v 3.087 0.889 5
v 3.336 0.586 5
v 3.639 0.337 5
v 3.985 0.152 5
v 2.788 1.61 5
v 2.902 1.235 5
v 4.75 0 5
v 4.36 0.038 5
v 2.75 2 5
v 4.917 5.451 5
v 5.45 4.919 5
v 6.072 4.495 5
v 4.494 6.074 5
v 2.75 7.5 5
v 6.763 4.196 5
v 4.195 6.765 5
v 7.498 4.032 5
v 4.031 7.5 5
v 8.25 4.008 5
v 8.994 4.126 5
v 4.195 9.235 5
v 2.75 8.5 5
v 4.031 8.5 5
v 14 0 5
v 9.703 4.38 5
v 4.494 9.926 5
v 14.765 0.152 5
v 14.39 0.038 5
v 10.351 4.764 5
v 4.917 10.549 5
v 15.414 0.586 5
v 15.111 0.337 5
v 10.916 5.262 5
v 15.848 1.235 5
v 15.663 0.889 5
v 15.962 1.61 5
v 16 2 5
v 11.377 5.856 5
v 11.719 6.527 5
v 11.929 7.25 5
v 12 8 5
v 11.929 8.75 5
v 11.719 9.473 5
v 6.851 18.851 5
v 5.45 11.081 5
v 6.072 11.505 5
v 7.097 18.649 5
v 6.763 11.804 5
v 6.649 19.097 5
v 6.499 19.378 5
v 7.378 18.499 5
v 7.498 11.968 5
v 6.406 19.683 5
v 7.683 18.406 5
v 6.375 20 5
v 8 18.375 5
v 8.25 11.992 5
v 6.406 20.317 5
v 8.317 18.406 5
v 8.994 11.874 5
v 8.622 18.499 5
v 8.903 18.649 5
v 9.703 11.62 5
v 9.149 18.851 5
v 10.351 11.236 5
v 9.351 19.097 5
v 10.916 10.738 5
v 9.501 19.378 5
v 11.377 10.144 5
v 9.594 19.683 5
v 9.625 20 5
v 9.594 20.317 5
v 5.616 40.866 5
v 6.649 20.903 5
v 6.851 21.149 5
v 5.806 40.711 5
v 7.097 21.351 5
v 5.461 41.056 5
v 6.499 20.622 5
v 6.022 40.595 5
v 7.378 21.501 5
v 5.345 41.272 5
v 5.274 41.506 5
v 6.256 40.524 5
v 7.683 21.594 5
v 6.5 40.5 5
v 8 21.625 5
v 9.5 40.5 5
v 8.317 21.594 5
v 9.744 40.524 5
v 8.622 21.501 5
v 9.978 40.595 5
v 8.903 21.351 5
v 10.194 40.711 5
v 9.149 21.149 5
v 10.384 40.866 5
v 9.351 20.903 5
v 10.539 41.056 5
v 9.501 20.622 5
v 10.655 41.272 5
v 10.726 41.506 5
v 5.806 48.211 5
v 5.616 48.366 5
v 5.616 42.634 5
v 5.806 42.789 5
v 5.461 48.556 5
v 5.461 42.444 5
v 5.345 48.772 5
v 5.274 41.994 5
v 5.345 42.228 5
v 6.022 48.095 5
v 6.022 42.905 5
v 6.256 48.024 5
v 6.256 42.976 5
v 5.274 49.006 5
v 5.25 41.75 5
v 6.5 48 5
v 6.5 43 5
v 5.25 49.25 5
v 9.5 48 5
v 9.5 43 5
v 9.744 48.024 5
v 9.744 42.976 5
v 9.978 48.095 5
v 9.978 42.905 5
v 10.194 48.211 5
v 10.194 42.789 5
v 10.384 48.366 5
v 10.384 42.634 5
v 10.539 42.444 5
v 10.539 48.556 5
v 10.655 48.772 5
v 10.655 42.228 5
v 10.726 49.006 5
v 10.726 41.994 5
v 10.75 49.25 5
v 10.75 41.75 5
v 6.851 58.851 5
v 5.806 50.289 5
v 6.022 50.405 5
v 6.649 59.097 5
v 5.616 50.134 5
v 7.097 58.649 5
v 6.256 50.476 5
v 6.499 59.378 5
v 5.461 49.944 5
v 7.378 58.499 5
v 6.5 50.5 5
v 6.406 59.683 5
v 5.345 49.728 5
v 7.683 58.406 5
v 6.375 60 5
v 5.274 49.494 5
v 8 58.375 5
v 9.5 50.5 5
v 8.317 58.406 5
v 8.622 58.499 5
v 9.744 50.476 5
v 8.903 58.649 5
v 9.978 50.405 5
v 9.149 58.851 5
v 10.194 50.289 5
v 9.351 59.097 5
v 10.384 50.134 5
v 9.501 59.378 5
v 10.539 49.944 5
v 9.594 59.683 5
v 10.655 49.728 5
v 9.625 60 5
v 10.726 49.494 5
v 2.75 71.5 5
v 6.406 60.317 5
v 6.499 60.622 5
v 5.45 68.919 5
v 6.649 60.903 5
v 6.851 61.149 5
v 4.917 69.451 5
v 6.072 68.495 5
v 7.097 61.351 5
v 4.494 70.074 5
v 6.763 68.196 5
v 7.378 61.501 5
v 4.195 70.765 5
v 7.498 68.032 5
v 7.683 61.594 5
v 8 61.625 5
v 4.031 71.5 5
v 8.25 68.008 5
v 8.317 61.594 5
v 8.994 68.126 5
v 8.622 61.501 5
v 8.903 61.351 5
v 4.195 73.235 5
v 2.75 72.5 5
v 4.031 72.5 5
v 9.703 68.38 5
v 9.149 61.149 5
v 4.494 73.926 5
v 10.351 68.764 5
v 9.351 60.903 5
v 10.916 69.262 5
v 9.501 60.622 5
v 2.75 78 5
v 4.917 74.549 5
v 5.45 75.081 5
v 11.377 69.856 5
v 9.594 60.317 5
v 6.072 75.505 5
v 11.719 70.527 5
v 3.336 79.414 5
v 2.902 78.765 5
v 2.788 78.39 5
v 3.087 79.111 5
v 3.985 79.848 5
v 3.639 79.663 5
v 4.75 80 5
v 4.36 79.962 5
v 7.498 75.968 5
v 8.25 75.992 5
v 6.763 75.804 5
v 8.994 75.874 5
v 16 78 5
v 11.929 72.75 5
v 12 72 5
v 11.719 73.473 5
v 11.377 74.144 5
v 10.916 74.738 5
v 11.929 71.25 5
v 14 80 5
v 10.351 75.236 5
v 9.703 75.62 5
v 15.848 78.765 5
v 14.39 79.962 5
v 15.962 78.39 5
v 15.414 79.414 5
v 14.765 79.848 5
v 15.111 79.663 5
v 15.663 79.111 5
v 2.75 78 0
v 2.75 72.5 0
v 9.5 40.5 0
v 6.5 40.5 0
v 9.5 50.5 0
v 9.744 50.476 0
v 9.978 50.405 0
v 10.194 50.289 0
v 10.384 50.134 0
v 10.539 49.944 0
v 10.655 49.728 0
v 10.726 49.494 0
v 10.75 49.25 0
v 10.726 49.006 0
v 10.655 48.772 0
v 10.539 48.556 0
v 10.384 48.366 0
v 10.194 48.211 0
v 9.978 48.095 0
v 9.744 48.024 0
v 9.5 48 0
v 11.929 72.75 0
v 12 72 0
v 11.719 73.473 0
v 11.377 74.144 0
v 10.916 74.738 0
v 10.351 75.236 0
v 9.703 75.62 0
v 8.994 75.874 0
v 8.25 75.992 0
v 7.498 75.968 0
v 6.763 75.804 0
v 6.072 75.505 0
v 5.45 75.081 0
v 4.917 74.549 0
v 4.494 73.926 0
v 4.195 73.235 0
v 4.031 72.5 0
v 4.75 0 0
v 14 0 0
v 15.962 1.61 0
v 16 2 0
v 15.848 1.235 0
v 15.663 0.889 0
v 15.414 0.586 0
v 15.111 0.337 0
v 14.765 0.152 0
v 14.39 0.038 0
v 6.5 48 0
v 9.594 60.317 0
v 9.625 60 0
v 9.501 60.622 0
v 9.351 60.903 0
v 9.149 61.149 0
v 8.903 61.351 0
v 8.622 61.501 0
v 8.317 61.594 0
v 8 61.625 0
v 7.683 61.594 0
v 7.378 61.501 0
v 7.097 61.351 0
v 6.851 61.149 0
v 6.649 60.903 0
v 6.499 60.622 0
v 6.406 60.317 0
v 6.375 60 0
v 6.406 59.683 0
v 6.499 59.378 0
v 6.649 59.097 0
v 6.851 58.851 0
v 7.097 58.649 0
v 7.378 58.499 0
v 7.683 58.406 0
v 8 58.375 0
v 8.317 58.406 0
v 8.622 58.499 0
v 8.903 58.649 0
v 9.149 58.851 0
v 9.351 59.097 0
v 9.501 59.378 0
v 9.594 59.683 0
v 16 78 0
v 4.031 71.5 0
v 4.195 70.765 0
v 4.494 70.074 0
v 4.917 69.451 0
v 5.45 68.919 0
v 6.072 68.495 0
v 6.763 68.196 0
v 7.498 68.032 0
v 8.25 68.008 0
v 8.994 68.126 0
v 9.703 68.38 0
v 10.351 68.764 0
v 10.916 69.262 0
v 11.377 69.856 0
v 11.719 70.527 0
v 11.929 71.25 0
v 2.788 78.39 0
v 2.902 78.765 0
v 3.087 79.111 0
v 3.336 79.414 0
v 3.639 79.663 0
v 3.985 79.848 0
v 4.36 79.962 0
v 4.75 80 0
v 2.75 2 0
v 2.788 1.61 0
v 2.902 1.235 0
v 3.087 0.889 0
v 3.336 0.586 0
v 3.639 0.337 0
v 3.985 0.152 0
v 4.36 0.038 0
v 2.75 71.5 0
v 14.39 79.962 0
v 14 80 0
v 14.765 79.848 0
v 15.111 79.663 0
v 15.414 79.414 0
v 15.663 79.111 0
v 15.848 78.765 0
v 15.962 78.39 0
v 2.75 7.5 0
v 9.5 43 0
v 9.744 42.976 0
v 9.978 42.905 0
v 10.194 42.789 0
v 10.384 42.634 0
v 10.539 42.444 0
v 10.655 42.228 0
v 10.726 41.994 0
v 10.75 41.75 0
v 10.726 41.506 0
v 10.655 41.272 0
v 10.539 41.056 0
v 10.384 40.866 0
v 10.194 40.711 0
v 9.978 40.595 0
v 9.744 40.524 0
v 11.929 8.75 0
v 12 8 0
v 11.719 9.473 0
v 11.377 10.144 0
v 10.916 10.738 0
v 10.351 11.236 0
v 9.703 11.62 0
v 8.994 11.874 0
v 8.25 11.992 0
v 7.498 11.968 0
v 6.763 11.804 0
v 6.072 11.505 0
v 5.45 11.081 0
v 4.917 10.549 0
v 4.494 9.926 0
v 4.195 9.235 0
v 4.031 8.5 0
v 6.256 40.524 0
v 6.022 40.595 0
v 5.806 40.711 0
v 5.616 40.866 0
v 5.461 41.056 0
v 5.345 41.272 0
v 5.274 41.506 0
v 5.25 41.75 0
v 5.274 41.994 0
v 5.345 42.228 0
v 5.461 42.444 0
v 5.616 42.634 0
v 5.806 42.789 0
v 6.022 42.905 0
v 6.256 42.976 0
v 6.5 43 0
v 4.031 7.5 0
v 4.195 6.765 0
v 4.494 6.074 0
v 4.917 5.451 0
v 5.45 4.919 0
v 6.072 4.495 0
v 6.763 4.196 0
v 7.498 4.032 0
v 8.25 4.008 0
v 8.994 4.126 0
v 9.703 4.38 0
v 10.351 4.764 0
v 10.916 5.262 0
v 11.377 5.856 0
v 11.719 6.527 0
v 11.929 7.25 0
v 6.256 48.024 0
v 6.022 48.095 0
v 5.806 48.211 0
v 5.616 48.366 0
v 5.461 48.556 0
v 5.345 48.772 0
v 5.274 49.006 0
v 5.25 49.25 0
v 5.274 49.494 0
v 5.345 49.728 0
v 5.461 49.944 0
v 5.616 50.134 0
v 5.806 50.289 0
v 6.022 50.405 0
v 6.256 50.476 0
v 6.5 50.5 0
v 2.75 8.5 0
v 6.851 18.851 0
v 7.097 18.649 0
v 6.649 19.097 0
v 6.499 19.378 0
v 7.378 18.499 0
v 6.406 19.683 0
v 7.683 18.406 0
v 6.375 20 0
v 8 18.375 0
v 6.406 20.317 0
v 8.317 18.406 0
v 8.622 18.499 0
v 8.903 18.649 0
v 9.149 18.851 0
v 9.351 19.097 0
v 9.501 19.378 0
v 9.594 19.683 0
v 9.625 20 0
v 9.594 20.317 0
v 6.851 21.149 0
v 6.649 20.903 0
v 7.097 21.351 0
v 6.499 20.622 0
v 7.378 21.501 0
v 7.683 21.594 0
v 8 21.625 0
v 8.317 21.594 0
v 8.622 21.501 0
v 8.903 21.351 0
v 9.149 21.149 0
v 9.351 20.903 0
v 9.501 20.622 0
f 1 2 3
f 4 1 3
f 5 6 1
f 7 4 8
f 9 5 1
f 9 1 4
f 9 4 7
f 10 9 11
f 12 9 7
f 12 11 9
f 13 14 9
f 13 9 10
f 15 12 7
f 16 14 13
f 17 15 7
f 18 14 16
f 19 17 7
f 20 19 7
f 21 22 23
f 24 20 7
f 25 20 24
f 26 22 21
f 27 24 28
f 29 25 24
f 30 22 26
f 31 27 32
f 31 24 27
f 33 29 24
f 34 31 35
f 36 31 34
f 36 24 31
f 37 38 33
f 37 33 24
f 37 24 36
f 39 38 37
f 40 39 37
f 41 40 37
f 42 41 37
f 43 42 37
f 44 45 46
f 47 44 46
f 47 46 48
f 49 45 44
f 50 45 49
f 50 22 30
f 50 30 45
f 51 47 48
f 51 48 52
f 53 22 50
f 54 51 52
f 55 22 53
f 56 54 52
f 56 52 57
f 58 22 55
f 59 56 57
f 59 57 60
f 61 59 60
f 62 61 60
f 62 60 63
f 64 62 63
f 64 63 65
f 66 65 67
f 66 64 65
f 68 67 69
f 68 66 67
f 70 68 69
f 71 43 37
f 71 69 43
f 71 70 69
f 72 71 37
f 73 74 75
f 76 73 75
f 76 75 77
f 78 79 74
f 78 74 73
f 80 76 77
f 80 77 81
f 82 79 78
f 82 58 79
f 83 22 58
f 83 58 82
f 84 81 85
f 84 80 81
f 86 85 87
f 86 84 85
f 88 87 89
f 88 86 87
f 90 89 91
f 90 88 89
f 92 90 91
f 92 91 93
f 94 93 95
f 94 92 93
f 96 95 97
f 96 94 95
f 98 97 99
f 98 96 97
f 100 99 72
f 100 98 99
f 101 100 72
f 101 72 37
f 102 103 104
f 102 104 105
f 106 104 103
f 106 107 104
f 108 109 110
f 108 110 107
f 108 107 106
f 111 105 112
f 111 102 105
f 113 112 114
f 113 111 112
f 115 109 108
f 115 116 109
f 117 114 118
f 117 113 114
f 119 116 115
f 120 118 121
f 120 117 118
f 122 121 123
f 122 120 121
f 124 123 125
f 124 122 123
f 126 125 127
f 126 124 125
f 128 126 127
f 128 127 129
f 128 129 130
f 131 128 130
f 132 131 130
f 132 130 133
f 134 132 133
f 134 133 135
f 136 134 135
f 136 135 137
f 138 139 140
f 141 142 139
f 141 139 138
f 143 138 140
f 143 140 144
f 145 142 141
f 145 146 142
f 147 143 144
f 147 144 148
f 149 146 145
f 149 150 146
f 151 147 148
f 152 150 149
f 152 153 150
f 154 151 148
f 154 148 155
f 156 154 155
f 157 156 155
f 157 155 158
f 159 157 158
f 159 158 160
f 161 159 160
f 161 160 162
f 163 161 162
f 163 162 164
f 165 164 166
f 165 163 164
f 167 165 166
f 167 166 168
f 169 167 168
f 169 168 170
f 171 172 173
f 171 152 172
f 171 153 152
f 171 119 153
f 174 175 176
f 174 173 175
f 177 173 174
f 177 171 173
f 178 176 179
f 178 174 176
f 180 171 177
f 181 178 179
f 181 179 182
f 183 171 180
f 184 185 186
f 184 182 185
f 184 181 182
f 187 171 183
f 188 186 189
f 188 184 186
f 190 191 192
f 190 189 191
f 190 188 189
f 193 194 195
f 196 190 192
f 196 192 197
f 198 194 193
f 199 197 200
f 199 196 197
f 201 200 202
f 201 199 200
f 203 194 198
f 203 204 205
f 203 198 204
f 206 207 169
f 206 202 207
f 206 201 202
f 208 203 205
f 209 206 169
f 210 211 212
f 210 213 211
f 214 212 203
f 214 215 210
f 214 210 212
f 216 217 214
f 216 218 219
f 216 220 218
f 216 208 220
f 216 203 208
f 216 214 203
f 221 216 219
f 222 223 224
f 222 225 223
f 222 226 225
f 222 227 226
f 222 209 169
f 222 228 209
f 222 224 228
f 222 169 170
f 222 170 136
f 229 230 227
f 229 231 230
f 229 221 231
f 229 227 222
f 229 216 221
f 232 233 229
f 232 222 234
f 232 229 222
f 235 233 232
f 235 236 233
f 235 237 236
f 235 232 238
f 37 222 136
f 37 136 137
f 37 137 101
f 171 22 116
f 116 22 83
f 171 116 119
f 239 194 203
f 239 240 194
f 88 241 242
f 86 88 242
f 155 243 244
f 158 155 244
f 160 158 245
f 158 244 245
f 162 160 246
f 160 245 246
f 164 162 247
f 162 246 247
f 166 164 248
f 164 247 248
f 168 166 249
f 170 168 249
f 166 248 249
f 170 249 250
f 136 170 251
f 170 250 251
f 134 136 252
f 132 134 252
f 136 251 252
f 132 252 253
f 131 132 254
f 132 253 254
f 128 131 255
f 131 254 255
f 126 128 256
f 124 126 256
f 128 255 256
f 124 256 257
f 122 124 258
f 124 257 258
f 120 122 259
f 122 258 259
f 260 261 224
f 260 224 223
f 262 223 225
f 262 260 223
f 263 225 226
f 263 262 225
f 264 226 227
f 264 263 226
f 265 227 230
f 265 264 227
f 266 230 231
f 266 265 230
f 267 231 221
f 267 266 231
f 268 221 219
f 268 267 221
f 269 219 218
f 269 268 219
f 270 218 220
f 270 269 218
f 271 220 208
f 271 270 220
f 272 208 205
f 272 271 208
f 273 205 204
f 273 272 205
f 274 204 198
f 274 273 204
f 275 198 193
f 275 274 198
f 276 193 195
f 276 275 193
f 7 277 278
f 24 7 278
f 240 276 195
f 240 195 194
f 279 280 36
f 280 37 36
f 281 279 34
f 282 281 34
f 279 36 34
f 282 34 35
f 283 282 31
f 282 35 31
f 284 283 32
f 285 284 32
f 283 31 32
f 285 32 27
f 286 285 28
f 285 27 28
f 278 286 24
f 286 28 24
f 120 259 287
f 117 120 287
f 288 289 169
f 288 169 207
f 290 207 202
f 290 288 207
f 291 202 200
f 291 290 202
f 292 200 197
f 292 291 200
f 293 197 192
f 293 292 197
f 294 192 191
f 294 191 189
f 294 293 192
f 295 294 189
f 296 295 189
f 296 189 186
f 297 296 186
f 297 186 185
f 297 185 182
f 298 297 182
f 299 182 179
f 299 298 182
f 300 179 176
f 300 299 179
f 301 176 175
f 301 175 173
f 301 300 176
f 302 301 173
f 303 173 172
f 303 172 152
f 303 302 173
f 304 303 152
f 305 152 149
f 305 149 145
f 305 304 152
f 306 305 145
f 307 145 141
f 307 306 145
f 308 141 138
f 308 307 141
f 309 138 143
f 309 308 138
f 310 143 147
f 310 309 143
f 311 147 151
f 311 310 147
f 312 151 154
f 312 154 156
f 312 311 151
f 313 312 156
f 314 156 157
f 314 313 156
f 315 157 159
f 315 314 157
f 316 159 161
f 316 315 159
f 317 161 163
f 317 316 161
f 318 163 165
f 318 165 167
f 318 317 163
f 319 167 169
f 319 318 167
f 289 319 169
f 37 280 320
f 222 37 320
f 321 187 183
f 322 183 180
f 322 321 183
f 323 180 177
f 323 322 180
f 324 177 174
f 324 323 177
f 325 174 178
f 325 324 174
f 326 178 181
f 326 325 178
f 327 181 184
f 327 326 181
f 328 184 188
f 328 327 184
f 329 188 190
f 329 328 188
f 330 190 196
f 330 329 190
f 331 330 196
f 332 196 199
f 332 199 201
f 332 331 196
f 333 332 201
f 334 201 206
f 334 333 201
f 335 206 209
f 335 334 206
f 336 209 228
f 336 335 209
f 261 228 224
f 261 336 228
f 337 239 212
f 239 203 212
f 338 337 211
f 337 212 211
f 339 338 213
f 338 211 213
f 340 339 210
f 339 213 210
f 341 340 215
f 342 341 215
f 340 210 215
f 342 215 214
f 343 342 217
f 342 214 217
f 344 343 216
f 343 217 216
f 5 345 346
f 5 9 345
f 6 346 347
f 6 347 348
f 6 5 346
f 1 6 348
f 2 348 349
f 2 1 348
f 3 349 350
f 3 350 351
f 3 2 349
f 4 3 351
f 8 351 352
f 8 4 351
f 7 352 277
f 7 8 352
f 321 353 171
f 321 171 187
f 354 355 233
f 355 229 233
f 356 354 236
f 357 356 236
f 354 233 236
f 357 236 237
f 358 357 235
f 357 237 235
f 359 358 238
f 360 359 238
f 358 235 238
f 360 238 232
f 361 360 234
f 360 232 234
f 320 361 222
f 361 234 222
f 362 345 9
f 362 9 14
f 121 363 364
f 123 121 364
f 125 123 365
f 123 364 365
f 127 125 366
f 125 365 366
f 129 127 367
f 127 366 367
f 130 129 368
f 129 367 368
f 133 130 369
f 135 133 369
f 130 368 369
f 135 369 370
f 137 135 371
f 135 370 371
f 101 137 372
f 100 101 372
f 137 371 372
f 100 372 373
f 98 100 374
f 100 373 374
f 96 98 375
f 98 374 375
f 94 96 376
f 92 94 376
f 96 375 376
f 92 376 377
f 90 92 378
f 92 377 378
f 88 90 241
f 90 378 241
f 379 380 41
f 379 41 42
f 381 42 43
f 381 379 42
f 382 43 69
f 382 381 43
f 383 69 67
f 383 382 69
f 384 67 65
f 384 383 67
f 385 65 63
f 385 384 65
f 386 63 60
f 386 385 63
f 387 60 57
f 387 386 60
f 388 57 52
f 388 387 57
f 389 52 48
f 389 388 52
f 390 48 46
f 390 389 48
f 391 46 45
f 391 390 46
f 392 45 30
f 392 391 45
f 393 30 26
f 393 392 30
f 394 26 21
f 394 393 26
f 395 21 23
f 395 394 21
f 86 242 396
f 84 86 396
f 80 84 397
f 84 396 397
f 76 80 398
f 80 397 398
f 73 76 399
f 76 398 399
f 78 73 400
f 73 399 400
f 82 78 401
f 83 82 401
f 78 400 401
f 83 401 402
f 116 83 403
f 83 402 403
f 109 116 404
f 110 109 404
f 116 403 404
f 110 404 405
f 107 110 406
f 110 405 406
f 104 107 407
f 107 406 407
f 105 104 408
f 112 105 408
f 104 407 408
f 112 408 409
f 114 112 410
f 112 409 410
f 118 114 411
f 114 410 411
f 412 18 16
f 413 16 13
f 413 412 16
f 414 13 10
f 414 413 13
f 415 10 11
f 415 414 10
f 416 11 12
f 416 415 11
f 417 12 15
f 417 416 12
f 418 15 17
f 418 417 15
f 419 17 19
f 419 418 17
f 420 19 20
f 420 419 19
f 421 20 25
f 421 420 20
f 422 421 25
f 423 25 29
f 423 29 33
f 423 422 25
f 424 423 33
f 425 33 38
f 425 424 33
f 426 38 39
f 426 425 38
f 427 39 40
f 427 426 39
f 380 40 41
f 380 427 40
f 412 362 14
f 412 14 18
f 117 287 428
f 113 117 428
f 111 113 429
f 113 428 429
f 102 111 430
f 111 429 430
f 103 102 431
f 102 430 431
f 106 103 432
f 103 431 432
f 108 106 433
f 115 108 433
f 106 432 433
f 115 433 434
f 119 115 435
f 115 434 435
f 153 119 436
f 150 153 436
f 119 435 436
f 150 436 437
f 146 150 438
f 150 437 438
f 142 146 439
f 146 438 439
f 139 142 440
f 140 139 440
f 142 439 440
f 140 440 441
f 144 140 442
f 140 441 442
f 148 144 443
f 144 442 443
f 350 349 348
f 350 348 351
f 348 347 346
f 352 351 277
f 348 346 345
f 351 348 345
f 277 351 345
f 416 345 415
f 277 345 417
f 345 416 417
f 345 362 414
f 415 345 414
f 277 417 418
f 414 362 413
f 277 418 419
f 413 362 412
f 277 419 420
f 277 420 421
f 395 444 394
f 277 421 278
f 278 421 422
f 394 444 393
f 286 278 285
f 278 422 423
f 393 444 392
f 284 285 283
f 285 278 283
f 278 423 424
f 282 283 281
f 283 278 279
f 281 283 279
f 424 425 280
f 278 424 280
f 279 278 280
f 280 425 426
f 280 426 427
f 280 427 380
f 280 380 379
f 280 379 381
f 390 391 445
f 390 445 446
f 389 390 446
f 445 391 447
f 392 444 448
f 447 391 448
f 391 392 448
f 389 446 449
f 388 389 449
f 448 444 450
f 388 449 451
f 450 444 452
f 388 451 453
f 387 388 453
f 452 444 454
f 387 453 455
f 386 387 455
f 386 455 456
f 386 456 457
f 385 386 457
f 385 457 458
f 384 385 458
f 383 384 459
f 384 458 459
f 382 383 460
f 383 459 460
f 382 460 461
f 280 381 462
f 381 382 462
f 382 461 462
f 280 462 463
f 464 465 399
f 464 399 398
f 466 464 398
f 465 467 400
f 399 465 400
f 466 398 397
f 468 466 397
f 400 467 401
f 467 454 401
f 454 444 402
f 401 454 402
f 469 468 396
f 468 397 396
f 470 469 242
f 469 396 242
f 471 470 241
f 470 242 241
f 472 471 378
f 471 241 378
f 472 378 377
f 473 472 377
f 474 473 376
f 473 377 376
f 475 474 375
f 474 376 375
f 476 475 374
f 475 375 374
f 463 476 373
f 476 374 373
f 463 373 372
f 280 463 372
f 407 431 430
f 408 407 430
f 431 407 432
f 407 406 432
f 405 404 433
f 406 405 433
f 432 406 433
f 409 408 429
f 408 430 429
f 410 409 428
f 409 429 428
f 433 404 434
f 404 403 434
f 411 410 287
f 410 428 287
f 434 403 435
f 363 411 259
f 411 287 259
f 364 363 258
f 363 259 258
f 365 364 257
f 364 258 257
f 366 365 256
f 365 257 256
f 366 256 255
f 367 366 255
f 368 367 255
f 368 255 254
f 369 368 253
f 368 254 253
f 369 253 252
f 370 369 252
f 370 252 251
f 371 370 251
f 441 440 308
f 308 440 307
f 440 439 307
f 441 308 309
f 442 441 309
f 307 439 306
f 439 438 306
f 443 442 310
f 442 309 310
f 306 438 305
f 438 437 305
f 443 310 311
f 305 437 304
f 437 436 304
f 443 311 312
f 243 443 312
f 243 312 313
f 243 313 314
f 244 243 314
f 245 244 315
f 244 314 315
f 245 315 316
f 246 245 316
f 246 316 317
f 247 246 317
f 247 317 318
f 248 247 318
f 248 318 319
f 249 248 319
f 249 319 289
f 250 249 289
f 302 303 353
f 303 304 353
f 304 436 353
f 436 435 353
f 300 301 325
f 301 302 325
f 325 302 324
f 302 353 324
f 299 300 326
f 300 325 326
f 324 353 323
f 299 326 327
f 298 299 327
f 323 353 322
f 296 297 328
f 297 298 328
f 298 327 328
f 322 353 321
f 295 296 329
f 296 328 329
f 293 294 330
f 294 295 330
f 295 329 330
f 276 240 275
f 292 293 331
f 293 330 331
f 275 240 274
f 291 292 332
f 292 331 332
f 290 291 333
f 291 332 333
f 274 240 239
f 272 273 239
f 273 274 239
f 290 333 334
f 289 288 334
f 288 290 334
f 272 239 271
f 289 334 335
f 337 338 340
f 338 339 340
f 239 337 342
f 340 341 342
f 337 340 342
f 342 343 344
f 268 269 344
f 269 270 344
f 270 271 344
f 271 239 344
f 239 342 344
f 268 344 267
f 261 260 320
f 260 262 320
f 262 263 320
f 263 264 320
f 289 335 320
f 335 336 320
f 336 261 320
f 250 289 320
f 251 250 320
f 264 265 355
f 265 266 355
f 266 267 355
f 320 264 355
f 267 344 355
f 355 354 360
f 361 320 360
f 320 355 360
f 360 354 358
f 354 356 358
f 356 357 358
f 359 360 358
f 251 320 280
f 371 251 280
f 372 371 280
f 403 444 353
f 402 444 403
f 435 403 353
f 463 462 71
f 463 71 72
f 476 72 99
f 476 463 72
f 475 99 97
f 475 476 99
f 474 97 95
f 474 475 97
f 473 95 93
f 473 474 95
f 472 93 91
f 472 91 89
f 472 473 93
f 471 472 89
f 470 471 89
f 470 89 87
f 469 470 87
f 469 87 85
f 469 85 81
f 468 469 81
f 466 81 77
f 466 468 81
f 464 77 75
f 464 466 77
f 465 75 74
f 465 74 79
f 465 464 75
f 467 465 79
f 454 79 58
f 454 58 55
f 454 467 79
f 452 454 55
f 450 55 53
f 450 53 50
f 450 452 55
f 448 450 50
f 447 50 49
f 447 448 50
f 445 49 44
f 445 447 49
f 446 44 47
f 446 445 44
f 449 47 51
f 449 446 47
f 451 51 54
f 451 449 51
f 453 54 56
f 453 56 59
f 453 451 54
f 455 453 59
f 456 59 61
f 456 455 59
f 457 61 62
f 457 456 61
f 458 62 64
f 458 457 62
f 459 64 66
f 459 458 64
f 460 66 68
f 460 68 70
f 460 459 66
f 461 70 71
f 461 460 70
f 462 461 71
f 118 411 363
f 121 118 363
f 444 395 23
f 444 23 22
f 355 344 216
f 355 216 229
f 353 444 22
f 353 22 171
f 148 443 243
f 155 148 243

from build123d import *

# Parameters (mm, degrees)
SKETCH1_W           = 16
SKETCH1_H           = 80
SKETCH1_R           = 4
SKETCH1_R_2         = 1.625
BOSS_EXTRUDE1_DEPTH = 5
CUT_EXTRUDE3_DEPTH  = 82.737384348
SKETCH4_W           = 2.75
SKETCH4_H           = 80
CUT_EXTRUDE4_DEPTH  = 82.737384348
FILLET1_R           = 2


with BuildPart() as part:
    # Sketch1 → Boss-Extrude1 (new body)
    with BuildSketch(Plane.XY):
        with Locations((8, 40)):
            Rectangle(SKETCH1_W, SKETCH1_H)
        with Locations((8, 72)):
            Circle(SKETCH1_R, mode=Mode.SUBTRACT)
        with Locations((8, 8)):
            Circle(SKETCH1_R, mode=Mode.SUBTRACT)
        with Locations((8, 20)):
            Circle(SKETCH1_R_2, mode=Mode.SUBTRACT)
        with Locations((8, 60)):
            Circle(SKETCH1_R_2, mode=Mode.SUBTRACT)
        with BuildLine():
            Line((6.5, 50.5), (9.5, 50.5))
            ThreePointArc((9.5, 50.5), (10.75, 49.25), (9.5, 48))
            Line((9.5, 48), (6.5, 48))
            ThreePointArc((6.5, 48), (5.25, 49.25), (6.5, 50.5))
        make_face(mode=Mode.SUBTRACT)
        with BuildLine():
            Line((6.5, 43), (9.5, 43))
            ThreePointArc((9.5, 43), (10.75, 41.75), (9.5, 40.5))
            Line((9.5, 40.5), (6.5, 40.5))
            ThreePointArc((6.5, 40.5), (5.25, 41.75), (6.5, 43))
        make_face(mode=Mode.SUBTRACT)
    extrude(amount=BOSS_EXTRUDE1_DEPTH)

    # Sketch3 → Cut-Extrude3 (cut, through all)
    with BuildSketch(Plane(origin=(0, 0, 0), x_dir=(-1, 0, 0), z_dir=(0, 0, -1))):
        with BuildLine():
            Line((-8, 72.5), (0, 72.5))
            ThreePointArc((0, 72.5), (0.5, 72), (0, 71.5))
            Line((0, 71.5), (-8, 71.5))
            ThreePointArc((-8, 71.5), (-8.5, 72), (-8, 72.5))
        make_face()
        with BuildLine():
            Line((-8, 8.5), (0, 8.5))
            ThreePointArc((0, 8.5), (0.5, 8), (0, 7.5))
            Line((0, 7.5), (-8, 7.5))
            ThreePointArc((-8, 7.5), (-8.5, 8), (-8, 8.5))
        make_face()
    extrude(amount=-CUT_EXTRUDE3_DEPTH, mode=Mode.SUBTRACT)

    # Sketch4 → Cut-Extrude4 (cut, through all)
    with BuildSketch(Plane(origin=(0, 0, 0), x_dir=(-1, 0, 0), z_dir=(0, 0, -1))):
        with Locations((-1.375, 40)):
            Rectangle(SKETCH4_W, SKETCH4_H)
    extrude(amount=-CUT_EXTRUDE4_DEPTH, mode=Mode.SUBTRACT)

    # Fillet1
    fillet1_edges = [part.edges().sort_by_distance(p)[0] for p in [
        (2.75, 0, 2.5),
        (2.75, 80, 2.5),
        (16, 80, 2.5),
        (16, 0, 2.5),
    ]]
    fillet(fillet1_edges, radius=FILLET1_R)


solid = part.part
